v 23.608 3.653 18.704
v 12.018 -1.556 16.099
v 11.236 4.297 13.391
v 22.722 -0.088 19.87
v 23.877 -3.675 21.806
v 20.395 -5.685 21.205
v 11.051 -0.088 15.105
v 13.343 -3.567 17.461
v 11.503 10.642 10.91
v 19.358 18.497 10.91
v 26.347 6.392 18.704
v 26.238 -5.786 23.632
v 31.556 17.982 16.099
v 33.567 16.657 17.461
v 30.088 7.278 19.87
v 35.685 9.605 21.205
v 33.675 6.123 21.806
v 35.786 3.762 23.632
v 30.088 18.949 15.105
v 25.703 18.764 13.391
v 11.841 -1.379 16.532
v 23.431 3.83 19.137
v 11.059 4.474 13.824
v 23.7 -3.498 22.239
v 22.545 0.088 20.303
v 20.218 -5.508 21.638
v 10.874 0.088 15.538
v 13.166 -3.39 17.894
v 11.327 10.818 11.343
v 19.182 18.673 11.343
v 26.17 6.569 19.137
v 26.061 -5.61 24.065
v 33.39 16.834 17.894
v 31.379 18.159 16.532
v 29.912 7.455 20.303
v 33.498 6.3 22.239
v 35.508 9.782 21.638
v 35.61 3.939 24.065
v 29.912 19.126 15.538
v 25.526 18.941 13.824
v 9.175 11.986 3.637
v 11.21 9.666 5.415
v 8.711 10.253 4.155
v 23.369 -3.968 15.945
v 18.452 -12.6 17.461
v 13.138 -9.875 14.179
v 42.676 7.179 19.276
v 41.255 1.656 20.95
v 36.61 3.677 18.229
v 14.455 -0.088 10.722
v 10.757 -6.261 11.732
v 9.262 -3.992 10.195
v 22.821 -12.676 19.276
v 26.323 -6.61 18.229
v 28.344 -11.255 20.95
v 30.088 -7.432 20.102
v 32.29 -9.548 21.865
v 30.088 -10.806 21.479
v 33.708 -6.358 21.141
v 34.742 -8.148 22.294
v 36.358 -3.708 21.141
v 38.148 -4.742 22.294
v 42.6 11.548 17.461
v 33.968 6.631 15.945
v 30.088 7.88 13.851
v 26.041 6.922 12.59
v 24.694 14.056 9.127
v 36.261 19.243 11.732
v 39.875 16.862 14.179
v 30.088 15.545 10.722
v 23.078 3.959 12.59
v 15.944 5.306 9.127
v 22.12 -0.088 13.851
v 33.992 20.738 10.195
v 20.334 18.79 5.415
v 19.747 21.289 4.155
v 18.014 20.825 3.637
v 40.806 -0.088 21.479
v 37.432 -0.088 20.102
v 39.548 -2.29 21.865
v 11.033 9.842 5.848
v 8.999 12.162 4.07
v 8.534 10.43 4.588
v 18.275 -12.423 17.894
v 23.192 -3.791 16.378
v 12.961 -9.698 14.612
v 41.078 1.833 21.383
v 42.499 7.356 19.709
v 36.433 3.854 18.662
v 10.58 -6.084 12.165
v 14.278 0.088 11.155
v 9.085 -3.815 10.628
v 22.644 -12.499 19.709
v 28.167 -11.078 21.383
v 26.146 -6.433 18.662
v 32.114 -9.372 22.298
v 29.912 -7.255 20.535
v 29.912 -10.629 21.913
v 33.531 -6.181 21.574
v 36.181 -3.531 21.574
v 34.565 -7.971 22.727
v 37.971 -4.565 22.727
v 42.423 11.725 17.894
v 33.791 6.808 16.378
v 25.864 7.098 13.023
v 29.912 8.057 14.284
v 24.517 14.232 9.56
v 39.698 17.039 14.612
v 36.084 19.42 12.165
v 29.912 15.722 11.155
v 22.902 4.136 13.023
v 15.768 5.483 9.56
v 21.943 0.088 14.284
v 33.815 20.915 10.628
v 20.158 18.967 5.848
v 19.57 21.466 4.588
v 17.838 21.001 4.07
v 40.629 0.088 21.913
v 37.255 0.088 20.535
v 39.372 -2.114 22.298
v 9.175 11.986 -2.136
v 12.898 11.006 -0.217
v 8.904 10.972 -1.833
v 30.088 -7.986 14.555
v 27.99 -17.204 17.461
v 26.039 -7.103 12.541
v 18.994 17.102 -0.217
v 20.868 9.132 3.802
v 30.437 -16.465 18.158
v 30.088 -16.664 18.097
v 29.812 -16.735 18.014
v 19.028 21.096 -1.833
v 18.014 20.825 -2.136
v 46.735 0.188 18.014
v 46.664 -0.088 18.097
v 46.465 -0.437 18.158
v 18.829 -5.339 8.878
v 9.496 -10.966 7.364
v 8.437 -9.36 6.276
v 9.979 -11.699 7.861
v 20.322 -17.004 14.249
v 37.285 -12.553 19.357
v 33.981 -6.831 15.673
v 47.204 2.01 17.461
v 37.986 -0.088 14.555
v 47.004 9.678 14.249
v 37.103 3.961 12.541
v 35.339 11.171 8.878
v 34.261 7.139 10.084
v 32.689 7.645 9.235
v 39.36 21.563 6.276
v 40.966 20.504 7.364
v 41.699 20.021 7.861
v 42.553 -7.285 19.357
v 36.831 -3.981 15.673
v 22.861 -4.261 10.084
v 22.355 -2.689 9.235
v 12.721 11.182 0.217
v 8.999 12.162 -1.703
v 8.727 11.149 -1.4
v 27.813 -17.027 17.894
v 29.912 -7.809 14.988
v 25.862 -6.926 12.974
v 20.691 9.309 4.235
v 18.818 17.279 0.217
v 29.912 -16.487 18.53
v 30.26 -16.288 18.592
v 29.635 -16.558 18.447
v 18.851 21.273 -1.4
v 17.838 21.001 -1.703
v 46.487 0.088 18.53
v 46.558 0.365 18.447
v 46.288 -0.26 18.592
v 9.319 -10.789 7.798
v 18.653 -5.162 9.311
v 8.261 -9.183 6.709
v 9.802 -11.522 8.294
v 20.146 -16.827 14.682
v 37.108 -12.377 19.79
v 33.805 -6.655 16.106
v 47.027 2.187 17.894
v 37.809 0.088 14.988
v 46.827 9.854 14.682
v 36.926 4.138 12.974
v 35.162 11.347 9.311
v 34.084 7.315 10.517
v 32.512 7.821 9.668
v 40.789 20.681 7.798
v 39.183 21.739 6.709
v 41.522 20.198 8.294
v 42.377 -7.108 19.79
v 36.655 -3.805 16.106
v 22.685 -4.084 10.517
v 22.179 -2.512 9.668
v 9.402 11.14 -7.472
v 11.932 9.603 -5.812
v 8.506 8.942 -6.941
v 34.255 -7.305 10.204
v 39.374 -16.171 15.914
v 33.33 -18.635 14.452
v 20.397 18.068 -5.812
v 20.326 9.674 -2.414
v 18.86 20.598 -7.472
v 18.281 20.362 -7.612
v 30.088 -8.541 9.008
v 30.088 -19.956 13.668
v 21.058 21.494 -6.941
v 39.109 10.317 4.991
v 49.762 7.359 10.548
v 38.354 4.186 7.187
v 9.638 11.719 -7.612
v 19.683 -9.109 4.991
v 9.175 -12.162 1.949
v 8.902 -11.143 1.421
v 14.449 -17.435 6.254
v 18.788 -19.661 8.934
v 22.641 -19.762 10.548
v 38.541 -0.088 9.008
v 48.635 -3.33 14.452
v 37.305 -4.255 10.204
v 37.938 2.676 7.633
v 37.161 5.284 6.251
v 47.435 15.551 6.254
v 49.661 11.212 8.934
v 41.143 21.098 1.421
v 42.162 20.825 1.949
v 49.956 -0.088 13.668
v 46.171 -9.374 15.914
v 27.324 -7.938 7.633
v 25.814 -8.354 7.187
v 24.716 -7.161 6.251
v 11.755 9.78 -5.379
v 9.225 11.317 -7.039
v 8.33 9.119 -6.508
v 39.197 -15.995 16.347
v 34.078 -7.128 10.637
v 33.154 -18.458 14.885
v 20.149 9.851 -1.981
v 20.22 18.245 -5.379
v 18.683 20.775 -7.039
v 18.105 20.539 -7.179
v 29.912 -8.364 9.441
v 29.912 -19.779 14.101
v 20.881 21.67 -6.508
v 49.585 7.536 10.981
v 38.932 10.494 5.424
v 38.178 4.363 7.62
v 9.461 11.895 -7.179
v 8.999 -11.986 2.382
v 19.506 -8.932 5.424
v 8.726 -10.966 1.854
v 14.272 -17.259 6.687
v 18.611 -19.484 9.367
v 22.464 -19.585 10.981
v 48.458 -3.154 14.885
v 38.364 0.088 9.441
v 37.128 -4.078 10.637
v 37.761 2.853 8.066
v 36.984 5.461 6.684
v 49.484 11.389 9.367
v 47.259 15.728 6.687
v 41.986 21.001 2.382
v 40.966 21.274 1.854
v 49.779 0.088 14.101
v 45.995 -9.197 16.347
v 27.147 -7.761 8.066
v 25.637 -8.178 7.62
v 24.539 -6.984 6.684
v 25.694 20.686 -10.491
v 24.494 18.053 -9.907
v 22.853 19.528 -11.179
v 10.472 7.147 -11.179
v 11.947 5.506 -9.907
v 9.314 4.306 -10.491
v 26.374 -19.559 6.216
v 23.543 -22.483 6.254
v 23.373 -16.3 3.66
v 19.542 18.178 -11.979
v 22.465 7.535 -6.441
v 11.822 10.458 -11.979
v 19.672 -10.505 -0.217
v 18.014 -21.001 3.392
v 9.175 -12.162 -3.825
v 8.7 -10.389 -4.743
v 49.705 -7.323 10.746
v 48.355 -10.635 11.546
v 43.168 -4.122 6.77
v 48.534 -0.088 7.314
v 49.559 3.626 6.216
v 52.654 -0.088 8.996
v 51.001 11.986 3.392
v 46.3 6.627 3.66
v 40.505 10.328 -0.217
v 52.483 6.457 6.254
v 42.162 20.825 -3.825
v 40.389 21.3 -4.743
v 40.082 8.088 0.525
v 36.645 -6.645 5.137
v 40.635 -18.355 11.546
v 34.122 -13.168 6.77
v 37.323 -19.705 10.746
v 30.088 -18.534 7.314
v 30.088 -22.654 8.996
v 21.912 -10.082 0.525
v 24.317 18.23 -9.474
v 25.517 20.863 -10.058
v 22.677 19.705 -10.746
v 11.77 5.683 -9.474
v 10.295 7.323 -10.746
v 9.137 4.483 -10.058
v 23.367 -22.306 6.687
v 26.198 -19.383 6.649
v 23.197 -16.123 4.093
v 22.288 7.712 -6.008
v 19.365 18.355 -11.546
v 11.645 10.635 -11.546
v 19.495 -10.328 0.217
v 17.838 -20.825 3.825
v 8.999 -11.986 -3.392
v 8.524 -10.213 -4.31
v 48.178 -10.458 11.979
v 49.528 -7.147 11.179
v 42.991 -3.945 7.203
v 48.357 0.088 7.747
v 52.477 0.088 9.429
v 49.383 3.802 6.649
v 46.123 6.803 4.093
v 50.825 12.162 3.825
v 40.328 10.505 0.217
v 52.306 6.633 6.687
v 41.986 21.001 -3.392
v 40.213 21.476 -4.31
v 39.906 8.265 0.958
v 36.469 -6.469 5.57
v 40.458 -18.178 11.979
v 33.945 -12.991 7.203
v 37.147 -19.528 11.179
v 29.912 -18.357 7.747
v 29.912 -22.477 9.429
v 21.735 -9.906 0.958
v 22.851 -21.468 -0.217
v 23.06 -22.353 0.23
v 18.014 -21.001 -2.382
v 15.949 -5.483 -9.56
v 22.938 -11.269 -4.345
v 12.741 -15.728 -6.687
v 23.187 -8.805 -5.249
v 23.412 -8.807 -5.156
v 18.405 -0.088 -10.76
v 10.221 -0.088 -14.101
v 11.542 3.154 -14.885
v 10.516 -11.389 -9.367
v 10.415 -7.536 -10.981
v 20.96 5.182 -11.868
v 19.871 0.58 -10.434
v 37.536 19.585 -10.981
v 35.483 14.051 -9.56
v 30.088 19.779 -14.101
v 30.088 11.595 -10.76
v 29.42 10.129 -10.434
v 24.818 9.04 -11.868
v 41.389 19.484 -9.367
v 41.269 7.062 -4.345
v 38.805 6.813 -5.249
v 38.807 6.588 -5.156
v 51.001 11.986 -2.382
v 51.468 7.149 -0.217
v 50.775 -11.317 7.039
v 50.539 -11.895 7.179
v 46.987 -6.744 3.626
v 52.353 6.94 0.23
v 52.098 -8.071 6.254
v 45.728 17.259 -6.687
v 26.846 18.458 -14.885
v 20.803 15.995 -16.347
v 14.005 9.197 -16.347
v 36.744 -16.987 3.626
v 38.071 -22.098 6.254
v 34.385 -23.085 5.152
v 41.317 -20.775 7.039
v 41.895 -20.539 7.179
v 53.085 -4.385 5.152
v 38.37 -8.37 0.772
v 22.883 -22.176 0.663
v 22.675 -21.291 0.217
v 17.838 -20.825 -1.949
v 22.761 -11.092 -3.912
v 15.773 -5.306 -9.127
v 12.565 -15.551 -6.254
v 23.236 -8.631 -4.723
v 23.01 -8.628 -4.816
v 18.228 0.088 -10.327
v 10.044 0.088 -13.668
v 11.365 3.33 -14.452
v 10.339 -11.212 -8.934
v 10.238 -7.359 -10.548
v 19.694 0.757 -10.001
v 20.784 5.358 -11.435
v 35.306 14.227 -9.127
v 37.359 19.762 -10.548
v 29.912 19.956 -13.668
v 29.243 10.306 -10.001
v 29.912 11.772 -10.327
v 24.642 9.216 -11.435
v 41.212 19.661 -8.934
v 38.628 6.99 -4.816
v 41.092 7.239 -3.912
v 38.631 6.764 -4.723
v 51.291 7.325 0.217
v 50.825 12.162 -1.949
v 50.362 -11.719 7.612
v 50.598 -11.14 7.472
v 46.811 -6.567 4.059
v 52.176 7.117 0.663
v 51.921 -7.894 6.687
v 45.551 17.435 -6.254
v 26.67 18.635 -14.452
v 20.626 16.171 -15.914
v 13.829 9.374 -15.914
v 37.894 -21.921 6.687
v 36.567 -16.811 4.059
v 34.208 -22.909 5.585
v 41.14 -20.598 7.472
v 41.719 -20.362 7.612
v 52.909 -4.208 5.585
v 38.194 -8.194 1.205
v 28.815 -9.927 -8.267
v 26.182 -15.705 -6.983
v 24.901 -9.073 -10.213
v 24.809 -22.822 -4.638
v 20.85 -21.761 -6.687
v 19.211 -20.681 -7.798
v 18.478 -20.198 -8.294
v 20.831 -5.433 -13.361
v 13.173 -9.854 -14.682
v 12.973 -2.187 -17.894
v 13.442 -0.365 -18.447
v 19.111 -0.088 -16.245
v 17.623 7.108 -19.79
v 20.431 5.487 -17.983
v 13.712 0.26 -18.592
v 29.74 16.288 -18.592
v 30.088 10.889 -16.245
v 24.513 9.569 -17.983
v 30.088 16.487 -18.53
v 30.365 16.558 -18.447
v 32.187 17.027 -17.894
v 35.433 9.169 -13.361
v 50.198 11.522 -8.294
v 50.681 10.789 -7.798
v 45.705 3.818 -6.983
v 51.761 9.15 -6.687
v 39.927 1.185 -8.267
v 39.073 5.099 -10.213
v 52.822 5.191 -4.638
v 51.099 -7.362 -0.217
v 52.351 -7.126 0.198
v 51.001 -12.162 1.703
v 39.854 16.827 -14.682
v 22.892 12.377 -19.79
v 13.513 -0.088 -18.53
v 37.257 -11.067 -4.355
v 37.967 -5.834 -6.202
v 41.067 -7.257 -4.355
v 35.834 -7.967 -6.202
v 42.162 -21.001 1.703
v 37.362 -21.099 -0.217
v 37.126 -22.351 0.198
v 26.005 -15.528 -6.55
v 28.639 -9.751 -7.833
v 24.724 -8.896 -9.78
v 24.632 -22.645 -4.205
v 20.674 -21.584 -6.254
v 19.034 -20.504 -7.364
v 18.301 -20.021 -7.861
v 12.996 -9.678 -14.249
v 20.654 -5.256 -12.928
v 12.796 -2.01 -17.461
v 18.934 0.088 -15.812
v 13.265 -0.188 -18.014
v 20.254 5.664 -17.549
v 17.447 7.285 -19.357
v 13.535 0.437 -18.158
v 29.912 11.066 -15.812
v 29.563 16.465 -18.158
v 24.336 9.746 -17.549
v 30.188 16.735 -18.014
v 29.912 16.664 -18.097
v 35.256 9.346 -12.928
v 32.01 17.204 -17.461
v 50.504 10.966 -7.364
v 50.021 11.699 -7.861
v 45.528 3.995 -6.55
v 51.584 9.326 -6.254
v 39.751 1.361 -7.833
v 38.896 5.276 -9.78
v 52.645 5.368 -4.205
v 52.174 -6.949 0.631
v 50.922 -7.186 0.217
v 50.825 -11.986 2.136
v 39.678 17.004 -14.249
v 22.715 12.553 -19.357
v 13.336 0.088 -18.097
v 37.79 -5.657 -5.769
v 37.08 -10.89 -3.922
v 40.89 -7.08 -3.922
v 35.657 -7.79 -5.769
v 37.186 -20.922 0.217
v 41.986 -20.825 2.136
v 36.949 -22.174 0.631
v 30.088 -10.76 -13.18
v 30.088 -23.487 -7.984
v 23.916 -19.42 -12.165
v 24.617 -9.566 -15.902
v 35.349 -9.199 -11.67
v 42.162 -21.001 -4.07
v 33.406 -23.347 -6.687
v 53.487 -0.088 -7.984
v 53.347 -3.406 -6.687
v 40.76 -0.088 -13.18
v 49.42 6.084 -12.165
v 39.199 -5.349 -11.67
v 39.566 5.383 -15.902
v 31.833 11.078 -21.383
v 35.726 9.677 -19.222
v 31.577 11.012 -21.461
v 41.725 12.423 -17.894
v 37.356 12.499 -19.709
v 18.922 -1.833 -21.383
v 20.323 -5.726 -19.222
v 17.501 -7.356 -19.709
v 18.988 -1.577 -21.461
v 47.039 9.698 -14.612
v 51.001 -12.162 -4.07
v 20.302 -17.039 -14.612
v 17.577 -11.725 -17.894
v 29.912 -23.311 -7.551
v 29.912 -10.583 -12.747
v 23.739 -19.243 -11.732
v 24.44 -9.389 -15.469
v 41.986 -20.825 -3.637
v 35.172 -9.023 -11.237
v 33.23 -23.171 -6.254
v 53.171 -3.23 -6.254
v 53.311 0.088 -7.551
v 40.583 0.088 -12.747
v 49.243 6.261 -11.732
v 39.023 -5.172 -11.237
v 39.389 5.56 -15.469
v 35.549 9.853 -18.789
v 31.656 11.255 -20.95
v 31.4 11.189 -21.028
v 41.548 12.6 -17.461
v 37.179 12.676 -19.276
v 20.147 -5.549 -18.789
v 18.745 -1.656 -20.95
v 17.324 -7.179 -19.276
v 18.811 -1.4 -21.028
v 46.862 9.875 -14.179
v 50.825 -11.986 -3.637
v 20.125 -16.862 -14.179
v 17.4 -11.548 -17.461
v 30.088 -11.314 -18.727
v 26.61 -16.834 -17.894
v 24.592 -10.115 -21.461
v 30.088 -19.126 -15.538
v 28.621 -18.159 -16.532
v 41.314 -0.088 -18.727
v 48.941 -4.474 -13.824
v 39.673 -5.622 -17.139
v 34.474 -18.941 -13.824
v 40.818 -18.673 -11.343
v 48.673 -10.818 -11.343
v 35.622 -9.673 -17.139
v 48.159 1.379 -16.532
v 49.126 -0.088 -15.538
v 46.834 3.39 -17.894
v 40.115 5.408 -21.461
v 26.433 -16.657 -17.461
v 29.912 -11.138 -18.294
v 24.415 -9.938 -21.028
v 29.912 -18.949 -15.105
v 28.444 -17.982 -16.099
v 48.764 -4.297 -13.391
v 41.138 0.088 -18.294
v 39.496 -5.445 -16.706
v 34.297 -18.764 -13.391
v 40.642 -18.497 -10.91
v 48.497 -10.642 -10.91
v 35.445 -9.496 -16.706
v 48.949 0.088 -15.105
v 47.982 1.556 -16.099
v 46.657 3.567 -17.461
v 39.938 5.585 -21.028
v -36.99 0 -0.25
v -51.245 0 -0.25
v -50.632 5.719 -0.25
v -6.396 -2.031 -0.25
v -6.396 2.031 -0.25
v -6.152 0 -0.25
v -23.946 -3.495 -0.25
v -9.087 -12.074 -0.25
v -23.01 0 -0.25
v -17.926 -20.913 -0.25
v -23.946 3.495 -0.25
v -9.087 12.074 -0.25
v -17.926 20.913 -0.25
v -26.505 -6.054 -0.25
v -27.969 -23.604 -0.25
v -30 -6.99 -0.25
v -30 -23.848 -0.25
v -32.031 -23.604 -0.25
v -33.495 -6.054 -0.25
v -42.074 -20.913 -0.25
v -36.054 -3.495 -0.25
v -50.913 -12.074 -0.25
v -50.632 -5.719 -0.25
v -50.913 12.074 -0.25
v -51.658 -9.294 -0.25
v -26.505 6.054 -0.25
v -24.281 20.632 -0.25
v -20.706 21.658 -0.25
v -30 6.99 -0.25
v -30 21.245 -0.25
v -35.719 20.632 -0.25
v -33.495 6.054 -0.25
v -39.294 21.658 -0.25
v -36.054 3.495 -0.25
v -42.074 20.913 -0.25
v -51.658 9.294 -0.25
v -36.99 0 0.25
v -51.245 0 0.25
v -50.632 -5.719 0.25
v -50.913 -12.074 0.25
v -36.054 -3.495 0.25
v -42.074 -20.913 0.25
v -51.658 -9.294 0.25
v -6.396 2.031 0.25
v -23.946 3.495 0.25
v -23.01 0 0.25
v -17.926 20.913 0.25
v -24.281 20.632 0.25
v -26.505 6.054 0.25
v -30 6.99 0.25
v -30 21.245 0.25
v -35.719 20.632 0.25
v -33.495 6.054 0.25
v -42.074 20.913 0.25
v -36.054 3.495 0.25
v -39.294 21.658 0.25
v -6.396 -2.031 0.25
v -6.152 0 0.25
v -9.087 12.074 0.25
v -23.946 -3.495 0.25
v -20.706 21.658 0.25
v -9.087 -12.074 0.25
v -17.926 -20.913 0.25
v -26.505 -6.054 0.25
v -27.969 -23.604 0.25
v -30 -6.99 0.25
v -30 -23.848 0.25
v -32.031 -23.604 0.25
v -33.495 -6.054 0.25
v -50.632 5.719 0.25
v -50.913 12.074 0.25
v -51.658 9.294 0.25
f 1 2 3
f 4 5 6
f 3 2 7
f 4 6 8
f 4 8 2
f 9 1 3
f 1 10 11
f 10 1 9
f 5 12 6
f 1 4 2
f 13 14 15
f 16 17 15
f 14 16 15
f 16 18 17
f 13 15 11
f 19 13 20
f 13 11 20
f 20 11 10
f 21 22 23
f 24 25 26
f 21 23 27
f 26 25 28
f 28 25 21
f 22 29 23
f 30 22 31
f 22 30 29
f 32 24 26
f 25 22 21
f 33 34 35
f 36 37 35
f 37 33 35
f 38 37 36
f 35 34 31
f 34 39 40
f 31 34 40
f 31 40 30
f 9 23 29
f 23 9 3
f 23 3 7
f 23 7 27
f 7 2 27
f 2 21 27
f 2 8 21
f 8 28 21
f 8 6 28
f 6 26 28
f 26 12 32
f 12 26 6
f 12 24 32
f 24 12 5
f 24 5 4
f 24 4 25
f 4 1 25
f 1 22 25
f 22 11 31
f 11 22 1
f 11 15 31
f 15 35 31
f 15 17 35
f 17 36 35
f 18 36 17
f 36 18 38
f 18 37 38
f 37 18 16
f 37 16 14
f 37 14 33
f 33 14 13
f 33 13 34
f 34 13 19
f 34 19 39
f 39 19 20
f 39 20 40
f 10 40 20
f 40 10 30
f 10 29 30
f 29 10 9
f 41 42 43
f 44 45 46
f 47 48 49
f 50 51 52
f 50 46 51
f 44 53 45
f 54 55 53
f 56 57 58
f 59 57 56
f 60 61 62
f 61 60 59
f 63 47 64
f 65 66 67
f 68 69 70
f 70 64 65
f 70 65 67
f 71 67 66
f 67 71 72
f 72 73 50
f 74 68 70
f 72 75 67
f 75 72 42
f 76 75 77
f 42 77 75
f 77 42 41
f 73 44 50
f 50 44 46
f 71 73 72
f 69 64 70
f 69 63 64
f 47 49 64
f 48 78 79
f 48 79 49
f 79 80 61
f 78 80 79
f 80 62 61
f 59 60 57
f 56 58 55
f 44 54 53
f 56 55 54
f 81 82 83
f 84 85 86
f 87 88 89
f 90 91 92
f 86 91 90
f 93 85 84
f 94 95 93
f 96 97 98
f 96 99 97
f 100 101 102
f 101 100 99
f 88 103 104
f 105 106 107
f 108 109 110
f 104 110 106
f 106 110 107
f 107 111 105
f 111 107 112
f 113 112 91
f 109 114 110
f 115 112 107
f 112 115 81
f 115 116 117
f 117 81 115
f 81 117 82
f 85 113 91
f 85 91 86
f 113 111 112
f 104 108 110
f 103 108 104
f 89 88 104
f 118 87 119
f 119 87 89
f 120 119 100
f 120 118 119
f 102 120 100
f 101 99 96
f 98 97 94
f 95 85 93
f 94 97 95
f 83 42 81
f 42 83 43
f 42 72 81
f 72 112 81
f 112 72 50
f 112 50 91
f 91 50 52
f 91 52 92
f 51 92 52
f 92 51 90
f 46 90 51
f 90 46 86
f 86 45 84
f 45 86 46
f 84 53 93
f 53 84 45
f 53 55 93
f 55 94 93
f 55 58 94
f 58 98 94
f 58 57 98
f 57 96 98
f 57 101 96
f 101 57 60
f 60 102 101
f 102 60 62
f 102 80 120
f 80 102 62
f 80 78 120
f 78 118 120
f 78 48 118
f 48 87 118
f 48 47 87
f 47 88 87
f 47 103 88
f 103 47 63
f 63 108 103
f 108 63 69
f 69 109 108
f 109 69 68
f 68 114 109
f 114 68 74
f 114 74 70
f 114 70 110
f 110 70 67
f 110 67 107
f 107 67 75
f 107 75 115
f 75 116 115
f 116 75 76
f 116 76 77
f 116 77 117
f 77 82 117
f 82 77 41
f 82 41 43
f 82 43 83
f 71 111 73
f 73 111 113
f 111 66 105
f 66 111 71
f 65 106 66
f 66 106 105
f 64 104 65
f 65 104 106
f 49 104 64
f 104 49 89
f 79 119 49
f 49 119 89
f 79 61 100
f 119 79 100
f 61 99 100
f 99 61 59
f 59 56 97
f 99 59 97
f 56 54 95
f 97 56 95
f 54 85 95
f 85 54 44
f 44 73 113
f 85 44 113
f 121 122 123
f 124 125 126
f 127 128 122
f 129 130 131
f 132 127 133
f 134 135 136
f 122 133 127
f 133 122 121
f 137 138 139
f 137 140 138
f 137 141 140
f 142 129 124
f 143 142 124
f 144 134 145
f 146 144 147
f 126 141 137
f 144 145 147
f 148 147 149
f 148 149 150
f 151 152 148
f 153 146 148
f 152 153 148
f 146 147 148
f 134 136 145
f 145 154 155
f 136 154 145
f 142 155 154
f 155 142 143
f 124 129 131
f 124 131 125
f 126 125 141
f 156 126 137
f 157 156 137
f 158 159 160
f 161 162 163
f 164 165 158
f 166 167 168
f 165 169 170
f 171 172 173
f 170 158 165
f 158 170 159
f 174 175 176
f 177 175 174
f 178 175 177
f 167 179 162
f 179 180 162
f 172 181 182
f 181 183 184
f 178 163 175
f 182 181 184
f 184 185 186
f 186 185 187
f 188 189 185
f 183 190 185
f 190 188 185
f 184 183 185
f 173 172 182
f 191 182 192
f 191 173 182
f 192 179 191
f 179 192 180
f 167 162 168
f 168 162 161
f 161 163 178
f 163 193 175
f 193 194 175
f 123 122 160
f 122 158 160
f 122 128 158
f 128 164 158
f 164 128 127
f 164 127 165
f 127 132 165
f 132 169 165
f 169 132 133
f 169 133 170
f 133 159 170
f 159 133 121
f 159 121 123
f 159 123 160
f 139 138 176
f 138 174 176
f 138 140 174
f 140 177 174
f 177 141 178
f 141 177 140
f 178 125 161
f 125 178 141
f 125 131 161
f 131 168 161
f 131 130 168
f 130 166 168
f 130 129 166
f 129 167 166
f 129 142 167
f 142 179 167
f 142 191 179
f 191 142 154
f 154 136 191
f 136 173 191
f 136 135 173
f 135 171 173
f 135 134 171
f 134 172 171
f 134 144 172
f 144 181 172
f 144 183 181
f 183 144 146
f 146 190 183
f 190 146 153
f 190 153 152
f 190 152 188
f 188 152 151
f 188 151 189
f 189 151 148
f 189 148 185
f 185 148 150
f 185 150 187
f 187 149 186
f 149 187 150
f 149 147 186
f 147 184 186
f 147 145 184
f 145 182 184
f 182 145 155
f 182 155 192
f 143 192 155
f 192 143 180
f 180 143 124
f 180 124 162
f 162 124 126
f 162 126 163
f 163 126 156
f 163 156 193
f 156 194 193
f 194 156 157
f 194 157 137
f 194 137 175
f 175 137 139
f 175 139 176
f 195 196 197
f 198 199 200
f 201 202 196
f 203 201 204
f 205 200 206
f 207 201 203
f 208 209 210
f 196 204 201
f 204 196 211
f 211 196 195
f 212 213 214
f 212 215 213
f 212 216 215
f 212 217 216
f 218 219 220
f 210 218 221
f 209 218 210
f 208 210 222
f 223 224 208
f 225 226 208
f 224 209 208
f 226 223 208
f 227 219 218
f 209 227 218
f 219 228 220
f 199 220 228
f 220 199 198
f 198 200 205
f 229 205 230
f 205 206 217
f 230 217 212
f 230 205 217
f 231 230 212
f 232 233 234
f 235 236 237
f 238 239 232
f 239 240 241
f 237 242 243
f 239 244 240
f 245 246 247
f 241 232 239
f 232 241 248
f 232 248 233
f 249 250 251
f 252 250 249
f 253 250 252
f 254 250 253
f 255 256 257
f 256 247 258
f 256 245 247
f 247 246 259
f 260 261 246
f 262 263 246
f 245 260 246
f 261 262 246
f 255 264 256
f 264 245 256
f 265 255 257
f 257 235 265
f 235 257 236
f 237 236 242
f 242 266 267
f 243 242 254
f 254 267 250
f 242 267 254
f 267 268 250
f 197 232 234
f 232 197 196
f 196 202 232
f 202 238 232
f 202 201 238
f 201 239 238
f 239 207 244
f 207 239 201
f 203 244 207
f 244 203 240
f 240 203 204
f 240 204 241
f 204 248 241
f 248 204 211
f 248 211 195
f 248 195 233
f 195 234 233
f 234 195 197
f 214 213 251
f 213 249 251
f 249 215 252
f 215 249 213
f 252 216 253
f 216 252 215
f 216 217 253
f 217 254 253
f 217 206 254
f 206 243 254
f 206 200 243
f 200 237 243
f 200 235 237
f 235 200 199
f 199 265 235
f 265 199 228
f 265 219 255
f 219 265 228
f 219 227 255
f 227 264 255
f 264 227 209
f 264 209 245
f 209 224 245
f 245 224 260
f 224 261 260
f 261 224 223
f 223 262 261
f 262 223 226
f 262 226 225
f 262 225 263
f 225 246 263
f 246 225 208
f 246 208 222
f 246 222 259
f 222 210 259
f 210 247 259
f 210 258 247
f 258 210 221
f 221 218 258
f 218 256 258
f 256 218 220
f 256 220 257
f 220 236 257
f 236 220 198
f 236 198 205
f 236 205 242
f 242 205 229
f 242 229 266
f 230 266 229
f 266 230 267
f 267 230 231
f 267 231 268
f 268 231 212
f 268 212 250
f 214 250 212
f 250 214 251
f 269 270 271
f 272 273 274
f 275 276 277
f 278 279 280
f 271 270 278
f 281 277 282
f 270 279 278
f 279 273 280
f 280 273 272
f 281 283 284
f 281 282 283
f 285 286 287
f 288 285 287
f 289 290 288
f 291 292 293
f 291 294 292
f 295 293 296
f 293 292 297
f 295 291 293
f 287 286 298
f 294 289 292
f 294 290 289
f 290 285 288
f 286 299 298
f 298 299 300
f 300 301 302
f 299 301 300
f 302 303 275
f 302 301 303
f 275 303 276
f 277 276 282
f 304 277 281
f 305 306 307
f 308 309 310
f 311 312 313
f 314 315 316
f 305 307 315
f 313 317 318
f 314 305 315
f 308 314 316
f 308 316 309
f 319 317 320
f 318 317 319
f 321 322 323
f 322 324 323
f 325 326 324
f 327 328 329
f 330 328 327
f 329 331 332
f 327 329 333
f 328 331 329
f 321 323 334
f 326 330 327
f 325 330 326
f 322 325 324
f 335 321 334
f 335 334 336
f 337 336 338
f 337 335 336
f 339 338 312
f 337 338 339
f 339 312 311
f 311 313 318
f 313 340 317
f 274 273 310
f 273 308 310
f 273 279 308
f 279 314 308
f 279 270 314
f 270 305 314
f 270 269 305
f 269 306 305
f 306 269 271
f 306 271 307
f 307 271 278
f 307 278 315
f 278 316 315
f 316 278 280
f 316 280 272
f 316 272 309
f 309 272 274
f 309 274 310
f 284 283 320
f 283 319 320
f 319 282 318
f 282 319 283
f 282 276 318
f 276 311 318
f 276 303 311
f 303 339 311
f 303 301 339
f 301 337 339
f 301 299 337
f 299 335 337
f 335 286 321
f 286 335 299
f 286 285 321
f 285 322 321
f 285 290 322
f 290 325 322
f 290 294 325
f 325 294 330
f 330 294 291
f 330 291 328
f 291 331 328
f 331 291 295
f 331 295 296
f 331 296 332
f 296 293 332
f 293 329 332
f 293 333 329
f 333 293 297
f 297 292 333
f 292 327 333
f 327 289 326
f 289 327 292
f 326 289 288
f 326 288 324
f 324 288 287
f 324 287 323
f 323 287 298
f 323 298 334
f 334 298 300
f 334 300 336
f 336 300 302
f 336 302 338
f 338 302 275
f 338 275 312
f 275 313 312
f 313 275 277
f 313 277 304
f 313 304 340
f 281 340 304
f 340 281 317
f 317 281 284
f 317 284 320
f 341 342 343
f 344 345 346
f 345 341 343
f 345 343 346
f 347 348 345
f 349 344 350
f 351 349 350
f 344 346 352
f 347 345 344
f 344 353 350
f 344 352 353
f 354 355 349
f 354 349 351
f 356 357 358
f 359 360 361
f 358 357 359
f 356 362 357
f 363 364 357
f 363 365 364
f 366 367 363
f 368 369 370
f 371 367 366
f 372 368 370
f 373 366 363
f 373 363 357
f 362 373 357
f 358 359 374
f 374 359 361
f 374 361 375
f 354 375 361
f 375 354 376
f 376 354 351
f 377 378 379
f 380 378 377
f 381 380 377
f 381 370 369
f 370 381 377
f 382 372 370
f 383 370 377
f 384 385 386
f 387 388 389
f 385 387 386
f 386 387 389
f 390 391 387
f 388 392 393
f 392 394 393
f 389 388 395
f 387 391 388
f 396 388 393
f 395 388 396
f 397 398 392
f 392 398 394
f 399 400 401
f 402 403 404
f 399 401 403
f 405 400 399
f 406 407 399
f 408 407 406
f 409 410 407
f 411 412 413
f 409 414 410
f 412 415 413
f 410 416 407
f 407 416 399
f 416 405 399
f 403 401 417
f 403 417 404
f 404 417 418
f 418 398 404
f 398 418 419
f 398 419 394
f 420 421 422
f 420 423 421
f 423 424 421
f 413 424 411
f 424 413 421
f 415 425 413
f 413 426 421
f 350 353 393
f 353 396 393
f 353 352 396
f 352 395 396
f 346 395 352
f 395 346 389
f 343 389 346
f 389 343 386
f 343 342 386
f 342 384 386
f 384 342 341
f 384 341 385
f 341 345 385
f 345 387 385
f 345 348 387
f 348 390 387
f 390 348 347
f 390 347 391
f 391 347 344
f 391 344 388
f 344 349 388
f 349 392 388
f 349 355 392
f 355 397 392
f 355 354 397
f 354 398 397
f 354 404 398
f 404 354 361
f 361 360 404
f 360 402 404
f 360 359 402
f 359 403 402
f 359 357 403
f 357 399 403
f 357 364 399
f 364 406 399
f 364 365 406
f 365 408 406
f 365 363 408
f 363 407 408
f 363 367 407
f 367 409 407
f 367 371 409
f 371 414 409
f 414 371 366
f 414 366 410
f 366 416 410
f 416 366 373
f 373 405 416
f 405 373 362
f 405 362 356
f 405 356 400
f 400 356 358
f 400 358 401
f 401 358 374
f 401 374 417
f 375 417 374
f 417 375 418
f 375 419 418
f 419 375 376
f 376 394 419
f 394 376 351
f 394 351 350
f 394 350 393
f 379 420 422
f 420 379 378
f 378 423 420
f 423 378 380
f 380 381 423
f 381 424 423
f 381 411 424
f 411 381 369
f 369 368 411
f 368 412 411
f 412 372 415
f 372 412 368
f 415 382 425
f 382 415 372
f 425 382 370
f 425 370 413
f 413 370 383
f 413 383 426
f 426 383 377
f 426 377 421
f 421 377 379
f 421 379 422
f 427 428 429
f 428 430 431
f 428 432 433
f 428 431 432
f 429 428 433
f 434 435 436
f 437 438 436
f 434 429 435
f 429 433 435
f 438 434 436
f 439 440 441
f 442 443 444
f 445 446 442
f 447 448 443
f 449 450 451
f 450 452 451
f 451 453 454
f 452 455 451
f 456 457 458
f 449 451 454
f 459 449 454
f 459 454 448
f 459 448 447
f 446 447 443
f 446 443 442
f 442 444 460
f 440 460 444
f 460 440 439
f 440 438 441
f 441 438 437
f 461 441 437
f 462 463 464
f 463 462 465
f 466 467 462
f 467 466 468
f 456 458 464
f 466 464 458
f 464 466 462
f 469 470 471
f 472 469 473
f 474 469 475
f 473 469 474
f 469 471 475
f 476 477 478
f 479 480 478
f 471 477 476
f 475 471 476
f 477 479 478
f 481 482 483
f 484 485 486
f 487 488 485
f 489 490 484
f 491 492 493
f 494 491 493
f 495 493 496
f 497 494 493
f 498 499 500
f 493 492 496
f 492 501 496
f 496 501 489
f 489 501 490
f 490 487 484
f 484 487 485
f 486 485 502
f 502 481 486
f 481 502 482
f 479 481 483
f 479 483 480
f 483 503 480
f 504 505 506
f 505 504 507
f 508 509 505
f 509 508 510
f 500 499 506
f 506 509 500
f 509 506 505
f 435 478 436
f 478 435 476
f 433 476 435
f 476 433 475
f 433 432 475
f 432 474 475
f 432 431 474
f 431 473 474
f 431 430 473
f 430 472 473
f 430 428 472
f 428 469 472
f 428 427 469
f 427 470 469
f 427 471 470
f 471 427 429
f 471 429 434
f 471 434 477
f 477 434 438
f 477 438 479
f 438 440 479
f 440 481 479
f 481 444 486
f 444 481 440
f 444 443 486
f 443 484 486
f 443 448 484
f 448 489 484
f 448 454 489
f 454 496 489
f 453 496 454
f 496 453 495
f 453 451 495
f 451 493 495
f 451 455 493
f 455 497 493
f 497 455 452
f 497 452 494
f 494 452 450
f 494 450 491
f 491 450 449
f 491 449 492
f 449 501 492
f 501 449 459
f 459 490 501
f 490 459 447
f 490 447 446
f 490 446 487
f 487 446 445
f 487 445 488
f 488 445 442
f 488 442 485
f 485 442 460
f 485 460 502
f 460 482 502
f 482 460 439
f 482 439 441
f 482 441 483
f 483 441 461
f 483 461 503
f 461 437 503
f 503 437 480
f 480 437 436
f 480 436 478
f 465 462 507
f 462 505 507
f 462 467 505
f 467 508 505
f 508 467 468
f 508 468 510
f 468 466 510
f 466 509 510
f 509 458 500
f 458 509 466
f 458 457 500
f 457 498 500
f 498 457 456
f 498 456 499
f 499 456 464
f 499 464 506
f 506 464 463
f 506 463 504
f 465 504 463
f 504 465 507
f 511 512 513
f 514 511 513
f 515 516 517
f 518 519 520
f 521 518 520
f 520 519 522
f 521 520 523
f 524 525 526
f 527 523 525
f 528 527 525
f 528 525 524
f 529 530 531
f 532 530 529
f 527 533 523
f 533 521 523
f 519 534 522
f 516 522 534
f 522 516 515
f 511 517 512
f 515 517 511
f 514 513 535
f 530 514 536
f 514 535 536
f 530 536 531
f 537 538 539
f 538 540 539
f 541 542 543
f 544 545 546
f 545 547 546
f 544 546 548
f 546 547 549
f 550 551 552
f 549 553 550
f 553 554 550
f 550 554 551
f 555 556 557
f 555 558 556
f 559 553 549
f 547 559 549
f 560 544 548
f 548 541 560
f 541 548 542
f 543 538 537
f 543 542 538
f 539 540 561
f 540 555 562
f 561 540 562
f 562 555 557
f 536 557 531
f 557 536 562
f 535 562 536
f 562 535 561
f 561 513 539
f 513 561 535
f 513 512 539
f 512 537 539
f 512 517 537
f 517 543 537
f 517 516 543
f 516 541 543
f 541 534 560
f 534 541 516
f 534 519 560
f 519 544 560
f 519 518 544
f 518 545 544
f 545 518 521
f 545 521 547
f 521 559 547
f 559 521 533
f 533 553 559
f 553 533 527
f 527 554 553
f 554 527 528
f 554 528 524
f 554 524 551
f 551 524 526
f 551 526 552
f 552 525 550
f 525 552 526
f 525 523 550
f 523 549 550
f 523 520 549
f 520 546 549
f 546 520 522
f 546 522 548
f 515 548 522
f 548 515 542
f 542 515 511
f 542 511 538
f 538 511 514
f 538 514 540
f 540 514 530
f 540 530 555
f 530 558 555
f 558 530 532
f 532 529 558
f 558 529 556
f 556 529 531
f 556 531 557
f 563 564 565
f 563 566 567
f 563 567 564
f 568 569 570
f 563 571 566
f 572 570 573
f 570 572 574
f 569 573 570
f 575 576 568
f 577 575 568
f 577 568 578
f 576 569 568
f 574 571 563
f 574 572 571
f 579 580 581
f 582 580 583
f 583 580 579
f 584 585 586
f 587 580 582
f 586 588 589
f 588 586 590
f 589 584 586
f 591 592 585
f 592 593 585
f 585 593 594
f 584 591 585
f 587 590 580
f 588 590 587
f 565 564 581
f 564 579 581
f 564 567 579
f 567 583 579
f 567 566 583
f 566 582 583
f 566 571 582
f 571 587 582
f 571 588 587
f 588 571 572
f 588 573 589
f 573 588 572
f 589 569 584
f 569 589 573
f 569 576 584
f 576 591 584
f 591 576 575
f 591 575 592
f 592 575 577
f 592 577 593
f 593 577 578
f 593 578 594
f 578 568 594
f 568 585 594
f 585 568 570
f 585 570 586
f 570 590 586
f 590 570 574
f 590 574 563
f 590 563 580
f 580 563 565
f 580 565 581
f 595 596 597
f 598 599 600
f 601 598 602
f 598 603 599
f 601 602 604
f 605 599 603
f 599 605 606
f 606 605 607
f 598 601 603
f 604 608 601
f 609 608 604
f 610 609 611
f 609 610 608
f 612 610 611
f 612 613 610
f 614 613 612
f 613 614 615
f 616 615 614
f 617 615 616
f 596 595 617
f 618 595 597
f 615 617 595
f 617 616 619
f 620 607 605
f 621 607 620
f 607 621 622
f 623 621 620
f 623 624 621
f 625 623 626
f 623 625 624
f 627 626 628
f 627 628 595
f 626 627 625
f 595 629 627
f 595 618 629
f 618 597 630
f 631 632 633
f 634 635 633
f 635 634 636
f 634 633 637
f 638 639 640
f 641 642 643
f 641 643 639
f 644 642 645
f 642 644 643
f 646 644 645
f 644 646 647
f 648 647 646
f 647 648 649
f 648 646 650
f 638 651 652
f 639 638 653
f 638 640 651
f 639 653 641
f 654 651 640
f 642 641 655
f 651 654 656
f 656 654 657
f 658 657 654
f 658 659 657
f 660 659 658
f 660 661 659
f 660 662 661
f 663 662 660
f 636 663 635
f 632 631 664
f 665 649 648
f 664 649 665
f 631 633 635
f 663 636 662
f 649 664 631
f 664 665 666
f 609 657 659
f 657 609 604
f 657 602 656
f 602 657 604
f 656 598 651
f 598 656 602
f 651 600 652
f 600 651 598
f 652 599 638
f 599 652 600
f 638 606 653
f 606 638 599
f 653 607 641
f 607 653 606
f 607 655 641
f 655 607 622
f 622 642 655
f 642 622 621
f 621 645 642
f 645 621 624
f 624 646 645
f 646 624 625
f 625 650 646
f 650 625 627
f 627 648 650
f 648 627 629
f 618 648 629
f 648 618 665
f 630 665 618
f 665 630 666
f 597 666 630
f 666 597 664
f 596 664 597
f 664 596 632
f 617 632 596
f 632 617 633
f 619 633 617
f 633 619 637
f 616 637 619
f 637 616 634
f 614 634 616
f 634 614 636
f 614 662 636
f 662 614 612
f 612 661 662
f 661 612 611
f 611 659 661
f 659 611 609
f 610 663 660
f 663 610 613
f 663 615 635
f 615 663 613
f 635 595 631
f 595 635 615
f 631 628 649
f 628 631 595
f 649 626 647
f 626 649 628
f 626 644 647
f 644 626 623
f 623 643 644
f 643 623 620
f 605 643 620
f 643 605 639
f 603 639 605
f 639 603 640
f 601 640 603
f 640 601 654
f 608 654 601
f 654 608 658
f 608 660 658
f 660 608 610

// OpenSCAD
/*
 *  OpenSCAD (www.openscad.org)
 *  Copyright (C) 2009-2011 Clifford Wolf <clifford@clifford.at> and
 *                          Marius Kintel <marius@kintel.net>
 *
 *  This program is free software; you can redistribute it and/or modify
 *  it under the terms of the GNU General Public License as published by
 *  the Free Software Foundation; either version 2 of the License, or
 *  (at your option) any later version.
 *
 *  This program is distributed in the hope that it will be useful,
 *  but WITHOUT ANY WARRANTY; without even the implied warranty of
 *  MERCHANTABILITY or FITNESS FOR A PARTICULAR PURPOSE.  See the
 *  GNU General Public License for more details.
 *
 *  You should have received a copy of the GNU General Public License
 *  along with this program; if not, write to the Free Software
 *  Foundation, Inc., 59 Temple Place, Suite 330, Boston, MA  02111-1307  USA
 *
 */

module thing()
{
	$fa = 30;
	difference() {
		sphere(r = 25);
		cylinder(h = 62.5, r1 = 12.5, r2 = 6.25, center = true);
		rotate(90, [ 1, 0, 0 ]) cylinder(h = 62.5,
				r1 = 12.5, r2 = 6.25, center = true);
		rotate(90, [ 0, 1, 0 ]) cylinder(h = 62.5,
				r1 = 12.5, r2 = 6.25, center = true);
	}
}

module demo_proj()
{
	linear_extrude(center = true, height = 0.5) projection(cut = false) thing();
	% thing();
}

module demo_cut()
{
	for (i=[-20:5:+20]) {
		 rotate(-30, [ 1, 1, 0 ]) translate([ 0, 0, -i ])
			linear_extrude(center = true, height = 0.5) projection(cut = true)
				translate([ 0, 0, i ]) rotate(+30, [ 1, 1, 0 ]) thing();
	}
	% thing();
}

translate([ -30, 0, 0 ]) demo_proj();
translate([ +30, 0, 0 ]) demo_cut();
